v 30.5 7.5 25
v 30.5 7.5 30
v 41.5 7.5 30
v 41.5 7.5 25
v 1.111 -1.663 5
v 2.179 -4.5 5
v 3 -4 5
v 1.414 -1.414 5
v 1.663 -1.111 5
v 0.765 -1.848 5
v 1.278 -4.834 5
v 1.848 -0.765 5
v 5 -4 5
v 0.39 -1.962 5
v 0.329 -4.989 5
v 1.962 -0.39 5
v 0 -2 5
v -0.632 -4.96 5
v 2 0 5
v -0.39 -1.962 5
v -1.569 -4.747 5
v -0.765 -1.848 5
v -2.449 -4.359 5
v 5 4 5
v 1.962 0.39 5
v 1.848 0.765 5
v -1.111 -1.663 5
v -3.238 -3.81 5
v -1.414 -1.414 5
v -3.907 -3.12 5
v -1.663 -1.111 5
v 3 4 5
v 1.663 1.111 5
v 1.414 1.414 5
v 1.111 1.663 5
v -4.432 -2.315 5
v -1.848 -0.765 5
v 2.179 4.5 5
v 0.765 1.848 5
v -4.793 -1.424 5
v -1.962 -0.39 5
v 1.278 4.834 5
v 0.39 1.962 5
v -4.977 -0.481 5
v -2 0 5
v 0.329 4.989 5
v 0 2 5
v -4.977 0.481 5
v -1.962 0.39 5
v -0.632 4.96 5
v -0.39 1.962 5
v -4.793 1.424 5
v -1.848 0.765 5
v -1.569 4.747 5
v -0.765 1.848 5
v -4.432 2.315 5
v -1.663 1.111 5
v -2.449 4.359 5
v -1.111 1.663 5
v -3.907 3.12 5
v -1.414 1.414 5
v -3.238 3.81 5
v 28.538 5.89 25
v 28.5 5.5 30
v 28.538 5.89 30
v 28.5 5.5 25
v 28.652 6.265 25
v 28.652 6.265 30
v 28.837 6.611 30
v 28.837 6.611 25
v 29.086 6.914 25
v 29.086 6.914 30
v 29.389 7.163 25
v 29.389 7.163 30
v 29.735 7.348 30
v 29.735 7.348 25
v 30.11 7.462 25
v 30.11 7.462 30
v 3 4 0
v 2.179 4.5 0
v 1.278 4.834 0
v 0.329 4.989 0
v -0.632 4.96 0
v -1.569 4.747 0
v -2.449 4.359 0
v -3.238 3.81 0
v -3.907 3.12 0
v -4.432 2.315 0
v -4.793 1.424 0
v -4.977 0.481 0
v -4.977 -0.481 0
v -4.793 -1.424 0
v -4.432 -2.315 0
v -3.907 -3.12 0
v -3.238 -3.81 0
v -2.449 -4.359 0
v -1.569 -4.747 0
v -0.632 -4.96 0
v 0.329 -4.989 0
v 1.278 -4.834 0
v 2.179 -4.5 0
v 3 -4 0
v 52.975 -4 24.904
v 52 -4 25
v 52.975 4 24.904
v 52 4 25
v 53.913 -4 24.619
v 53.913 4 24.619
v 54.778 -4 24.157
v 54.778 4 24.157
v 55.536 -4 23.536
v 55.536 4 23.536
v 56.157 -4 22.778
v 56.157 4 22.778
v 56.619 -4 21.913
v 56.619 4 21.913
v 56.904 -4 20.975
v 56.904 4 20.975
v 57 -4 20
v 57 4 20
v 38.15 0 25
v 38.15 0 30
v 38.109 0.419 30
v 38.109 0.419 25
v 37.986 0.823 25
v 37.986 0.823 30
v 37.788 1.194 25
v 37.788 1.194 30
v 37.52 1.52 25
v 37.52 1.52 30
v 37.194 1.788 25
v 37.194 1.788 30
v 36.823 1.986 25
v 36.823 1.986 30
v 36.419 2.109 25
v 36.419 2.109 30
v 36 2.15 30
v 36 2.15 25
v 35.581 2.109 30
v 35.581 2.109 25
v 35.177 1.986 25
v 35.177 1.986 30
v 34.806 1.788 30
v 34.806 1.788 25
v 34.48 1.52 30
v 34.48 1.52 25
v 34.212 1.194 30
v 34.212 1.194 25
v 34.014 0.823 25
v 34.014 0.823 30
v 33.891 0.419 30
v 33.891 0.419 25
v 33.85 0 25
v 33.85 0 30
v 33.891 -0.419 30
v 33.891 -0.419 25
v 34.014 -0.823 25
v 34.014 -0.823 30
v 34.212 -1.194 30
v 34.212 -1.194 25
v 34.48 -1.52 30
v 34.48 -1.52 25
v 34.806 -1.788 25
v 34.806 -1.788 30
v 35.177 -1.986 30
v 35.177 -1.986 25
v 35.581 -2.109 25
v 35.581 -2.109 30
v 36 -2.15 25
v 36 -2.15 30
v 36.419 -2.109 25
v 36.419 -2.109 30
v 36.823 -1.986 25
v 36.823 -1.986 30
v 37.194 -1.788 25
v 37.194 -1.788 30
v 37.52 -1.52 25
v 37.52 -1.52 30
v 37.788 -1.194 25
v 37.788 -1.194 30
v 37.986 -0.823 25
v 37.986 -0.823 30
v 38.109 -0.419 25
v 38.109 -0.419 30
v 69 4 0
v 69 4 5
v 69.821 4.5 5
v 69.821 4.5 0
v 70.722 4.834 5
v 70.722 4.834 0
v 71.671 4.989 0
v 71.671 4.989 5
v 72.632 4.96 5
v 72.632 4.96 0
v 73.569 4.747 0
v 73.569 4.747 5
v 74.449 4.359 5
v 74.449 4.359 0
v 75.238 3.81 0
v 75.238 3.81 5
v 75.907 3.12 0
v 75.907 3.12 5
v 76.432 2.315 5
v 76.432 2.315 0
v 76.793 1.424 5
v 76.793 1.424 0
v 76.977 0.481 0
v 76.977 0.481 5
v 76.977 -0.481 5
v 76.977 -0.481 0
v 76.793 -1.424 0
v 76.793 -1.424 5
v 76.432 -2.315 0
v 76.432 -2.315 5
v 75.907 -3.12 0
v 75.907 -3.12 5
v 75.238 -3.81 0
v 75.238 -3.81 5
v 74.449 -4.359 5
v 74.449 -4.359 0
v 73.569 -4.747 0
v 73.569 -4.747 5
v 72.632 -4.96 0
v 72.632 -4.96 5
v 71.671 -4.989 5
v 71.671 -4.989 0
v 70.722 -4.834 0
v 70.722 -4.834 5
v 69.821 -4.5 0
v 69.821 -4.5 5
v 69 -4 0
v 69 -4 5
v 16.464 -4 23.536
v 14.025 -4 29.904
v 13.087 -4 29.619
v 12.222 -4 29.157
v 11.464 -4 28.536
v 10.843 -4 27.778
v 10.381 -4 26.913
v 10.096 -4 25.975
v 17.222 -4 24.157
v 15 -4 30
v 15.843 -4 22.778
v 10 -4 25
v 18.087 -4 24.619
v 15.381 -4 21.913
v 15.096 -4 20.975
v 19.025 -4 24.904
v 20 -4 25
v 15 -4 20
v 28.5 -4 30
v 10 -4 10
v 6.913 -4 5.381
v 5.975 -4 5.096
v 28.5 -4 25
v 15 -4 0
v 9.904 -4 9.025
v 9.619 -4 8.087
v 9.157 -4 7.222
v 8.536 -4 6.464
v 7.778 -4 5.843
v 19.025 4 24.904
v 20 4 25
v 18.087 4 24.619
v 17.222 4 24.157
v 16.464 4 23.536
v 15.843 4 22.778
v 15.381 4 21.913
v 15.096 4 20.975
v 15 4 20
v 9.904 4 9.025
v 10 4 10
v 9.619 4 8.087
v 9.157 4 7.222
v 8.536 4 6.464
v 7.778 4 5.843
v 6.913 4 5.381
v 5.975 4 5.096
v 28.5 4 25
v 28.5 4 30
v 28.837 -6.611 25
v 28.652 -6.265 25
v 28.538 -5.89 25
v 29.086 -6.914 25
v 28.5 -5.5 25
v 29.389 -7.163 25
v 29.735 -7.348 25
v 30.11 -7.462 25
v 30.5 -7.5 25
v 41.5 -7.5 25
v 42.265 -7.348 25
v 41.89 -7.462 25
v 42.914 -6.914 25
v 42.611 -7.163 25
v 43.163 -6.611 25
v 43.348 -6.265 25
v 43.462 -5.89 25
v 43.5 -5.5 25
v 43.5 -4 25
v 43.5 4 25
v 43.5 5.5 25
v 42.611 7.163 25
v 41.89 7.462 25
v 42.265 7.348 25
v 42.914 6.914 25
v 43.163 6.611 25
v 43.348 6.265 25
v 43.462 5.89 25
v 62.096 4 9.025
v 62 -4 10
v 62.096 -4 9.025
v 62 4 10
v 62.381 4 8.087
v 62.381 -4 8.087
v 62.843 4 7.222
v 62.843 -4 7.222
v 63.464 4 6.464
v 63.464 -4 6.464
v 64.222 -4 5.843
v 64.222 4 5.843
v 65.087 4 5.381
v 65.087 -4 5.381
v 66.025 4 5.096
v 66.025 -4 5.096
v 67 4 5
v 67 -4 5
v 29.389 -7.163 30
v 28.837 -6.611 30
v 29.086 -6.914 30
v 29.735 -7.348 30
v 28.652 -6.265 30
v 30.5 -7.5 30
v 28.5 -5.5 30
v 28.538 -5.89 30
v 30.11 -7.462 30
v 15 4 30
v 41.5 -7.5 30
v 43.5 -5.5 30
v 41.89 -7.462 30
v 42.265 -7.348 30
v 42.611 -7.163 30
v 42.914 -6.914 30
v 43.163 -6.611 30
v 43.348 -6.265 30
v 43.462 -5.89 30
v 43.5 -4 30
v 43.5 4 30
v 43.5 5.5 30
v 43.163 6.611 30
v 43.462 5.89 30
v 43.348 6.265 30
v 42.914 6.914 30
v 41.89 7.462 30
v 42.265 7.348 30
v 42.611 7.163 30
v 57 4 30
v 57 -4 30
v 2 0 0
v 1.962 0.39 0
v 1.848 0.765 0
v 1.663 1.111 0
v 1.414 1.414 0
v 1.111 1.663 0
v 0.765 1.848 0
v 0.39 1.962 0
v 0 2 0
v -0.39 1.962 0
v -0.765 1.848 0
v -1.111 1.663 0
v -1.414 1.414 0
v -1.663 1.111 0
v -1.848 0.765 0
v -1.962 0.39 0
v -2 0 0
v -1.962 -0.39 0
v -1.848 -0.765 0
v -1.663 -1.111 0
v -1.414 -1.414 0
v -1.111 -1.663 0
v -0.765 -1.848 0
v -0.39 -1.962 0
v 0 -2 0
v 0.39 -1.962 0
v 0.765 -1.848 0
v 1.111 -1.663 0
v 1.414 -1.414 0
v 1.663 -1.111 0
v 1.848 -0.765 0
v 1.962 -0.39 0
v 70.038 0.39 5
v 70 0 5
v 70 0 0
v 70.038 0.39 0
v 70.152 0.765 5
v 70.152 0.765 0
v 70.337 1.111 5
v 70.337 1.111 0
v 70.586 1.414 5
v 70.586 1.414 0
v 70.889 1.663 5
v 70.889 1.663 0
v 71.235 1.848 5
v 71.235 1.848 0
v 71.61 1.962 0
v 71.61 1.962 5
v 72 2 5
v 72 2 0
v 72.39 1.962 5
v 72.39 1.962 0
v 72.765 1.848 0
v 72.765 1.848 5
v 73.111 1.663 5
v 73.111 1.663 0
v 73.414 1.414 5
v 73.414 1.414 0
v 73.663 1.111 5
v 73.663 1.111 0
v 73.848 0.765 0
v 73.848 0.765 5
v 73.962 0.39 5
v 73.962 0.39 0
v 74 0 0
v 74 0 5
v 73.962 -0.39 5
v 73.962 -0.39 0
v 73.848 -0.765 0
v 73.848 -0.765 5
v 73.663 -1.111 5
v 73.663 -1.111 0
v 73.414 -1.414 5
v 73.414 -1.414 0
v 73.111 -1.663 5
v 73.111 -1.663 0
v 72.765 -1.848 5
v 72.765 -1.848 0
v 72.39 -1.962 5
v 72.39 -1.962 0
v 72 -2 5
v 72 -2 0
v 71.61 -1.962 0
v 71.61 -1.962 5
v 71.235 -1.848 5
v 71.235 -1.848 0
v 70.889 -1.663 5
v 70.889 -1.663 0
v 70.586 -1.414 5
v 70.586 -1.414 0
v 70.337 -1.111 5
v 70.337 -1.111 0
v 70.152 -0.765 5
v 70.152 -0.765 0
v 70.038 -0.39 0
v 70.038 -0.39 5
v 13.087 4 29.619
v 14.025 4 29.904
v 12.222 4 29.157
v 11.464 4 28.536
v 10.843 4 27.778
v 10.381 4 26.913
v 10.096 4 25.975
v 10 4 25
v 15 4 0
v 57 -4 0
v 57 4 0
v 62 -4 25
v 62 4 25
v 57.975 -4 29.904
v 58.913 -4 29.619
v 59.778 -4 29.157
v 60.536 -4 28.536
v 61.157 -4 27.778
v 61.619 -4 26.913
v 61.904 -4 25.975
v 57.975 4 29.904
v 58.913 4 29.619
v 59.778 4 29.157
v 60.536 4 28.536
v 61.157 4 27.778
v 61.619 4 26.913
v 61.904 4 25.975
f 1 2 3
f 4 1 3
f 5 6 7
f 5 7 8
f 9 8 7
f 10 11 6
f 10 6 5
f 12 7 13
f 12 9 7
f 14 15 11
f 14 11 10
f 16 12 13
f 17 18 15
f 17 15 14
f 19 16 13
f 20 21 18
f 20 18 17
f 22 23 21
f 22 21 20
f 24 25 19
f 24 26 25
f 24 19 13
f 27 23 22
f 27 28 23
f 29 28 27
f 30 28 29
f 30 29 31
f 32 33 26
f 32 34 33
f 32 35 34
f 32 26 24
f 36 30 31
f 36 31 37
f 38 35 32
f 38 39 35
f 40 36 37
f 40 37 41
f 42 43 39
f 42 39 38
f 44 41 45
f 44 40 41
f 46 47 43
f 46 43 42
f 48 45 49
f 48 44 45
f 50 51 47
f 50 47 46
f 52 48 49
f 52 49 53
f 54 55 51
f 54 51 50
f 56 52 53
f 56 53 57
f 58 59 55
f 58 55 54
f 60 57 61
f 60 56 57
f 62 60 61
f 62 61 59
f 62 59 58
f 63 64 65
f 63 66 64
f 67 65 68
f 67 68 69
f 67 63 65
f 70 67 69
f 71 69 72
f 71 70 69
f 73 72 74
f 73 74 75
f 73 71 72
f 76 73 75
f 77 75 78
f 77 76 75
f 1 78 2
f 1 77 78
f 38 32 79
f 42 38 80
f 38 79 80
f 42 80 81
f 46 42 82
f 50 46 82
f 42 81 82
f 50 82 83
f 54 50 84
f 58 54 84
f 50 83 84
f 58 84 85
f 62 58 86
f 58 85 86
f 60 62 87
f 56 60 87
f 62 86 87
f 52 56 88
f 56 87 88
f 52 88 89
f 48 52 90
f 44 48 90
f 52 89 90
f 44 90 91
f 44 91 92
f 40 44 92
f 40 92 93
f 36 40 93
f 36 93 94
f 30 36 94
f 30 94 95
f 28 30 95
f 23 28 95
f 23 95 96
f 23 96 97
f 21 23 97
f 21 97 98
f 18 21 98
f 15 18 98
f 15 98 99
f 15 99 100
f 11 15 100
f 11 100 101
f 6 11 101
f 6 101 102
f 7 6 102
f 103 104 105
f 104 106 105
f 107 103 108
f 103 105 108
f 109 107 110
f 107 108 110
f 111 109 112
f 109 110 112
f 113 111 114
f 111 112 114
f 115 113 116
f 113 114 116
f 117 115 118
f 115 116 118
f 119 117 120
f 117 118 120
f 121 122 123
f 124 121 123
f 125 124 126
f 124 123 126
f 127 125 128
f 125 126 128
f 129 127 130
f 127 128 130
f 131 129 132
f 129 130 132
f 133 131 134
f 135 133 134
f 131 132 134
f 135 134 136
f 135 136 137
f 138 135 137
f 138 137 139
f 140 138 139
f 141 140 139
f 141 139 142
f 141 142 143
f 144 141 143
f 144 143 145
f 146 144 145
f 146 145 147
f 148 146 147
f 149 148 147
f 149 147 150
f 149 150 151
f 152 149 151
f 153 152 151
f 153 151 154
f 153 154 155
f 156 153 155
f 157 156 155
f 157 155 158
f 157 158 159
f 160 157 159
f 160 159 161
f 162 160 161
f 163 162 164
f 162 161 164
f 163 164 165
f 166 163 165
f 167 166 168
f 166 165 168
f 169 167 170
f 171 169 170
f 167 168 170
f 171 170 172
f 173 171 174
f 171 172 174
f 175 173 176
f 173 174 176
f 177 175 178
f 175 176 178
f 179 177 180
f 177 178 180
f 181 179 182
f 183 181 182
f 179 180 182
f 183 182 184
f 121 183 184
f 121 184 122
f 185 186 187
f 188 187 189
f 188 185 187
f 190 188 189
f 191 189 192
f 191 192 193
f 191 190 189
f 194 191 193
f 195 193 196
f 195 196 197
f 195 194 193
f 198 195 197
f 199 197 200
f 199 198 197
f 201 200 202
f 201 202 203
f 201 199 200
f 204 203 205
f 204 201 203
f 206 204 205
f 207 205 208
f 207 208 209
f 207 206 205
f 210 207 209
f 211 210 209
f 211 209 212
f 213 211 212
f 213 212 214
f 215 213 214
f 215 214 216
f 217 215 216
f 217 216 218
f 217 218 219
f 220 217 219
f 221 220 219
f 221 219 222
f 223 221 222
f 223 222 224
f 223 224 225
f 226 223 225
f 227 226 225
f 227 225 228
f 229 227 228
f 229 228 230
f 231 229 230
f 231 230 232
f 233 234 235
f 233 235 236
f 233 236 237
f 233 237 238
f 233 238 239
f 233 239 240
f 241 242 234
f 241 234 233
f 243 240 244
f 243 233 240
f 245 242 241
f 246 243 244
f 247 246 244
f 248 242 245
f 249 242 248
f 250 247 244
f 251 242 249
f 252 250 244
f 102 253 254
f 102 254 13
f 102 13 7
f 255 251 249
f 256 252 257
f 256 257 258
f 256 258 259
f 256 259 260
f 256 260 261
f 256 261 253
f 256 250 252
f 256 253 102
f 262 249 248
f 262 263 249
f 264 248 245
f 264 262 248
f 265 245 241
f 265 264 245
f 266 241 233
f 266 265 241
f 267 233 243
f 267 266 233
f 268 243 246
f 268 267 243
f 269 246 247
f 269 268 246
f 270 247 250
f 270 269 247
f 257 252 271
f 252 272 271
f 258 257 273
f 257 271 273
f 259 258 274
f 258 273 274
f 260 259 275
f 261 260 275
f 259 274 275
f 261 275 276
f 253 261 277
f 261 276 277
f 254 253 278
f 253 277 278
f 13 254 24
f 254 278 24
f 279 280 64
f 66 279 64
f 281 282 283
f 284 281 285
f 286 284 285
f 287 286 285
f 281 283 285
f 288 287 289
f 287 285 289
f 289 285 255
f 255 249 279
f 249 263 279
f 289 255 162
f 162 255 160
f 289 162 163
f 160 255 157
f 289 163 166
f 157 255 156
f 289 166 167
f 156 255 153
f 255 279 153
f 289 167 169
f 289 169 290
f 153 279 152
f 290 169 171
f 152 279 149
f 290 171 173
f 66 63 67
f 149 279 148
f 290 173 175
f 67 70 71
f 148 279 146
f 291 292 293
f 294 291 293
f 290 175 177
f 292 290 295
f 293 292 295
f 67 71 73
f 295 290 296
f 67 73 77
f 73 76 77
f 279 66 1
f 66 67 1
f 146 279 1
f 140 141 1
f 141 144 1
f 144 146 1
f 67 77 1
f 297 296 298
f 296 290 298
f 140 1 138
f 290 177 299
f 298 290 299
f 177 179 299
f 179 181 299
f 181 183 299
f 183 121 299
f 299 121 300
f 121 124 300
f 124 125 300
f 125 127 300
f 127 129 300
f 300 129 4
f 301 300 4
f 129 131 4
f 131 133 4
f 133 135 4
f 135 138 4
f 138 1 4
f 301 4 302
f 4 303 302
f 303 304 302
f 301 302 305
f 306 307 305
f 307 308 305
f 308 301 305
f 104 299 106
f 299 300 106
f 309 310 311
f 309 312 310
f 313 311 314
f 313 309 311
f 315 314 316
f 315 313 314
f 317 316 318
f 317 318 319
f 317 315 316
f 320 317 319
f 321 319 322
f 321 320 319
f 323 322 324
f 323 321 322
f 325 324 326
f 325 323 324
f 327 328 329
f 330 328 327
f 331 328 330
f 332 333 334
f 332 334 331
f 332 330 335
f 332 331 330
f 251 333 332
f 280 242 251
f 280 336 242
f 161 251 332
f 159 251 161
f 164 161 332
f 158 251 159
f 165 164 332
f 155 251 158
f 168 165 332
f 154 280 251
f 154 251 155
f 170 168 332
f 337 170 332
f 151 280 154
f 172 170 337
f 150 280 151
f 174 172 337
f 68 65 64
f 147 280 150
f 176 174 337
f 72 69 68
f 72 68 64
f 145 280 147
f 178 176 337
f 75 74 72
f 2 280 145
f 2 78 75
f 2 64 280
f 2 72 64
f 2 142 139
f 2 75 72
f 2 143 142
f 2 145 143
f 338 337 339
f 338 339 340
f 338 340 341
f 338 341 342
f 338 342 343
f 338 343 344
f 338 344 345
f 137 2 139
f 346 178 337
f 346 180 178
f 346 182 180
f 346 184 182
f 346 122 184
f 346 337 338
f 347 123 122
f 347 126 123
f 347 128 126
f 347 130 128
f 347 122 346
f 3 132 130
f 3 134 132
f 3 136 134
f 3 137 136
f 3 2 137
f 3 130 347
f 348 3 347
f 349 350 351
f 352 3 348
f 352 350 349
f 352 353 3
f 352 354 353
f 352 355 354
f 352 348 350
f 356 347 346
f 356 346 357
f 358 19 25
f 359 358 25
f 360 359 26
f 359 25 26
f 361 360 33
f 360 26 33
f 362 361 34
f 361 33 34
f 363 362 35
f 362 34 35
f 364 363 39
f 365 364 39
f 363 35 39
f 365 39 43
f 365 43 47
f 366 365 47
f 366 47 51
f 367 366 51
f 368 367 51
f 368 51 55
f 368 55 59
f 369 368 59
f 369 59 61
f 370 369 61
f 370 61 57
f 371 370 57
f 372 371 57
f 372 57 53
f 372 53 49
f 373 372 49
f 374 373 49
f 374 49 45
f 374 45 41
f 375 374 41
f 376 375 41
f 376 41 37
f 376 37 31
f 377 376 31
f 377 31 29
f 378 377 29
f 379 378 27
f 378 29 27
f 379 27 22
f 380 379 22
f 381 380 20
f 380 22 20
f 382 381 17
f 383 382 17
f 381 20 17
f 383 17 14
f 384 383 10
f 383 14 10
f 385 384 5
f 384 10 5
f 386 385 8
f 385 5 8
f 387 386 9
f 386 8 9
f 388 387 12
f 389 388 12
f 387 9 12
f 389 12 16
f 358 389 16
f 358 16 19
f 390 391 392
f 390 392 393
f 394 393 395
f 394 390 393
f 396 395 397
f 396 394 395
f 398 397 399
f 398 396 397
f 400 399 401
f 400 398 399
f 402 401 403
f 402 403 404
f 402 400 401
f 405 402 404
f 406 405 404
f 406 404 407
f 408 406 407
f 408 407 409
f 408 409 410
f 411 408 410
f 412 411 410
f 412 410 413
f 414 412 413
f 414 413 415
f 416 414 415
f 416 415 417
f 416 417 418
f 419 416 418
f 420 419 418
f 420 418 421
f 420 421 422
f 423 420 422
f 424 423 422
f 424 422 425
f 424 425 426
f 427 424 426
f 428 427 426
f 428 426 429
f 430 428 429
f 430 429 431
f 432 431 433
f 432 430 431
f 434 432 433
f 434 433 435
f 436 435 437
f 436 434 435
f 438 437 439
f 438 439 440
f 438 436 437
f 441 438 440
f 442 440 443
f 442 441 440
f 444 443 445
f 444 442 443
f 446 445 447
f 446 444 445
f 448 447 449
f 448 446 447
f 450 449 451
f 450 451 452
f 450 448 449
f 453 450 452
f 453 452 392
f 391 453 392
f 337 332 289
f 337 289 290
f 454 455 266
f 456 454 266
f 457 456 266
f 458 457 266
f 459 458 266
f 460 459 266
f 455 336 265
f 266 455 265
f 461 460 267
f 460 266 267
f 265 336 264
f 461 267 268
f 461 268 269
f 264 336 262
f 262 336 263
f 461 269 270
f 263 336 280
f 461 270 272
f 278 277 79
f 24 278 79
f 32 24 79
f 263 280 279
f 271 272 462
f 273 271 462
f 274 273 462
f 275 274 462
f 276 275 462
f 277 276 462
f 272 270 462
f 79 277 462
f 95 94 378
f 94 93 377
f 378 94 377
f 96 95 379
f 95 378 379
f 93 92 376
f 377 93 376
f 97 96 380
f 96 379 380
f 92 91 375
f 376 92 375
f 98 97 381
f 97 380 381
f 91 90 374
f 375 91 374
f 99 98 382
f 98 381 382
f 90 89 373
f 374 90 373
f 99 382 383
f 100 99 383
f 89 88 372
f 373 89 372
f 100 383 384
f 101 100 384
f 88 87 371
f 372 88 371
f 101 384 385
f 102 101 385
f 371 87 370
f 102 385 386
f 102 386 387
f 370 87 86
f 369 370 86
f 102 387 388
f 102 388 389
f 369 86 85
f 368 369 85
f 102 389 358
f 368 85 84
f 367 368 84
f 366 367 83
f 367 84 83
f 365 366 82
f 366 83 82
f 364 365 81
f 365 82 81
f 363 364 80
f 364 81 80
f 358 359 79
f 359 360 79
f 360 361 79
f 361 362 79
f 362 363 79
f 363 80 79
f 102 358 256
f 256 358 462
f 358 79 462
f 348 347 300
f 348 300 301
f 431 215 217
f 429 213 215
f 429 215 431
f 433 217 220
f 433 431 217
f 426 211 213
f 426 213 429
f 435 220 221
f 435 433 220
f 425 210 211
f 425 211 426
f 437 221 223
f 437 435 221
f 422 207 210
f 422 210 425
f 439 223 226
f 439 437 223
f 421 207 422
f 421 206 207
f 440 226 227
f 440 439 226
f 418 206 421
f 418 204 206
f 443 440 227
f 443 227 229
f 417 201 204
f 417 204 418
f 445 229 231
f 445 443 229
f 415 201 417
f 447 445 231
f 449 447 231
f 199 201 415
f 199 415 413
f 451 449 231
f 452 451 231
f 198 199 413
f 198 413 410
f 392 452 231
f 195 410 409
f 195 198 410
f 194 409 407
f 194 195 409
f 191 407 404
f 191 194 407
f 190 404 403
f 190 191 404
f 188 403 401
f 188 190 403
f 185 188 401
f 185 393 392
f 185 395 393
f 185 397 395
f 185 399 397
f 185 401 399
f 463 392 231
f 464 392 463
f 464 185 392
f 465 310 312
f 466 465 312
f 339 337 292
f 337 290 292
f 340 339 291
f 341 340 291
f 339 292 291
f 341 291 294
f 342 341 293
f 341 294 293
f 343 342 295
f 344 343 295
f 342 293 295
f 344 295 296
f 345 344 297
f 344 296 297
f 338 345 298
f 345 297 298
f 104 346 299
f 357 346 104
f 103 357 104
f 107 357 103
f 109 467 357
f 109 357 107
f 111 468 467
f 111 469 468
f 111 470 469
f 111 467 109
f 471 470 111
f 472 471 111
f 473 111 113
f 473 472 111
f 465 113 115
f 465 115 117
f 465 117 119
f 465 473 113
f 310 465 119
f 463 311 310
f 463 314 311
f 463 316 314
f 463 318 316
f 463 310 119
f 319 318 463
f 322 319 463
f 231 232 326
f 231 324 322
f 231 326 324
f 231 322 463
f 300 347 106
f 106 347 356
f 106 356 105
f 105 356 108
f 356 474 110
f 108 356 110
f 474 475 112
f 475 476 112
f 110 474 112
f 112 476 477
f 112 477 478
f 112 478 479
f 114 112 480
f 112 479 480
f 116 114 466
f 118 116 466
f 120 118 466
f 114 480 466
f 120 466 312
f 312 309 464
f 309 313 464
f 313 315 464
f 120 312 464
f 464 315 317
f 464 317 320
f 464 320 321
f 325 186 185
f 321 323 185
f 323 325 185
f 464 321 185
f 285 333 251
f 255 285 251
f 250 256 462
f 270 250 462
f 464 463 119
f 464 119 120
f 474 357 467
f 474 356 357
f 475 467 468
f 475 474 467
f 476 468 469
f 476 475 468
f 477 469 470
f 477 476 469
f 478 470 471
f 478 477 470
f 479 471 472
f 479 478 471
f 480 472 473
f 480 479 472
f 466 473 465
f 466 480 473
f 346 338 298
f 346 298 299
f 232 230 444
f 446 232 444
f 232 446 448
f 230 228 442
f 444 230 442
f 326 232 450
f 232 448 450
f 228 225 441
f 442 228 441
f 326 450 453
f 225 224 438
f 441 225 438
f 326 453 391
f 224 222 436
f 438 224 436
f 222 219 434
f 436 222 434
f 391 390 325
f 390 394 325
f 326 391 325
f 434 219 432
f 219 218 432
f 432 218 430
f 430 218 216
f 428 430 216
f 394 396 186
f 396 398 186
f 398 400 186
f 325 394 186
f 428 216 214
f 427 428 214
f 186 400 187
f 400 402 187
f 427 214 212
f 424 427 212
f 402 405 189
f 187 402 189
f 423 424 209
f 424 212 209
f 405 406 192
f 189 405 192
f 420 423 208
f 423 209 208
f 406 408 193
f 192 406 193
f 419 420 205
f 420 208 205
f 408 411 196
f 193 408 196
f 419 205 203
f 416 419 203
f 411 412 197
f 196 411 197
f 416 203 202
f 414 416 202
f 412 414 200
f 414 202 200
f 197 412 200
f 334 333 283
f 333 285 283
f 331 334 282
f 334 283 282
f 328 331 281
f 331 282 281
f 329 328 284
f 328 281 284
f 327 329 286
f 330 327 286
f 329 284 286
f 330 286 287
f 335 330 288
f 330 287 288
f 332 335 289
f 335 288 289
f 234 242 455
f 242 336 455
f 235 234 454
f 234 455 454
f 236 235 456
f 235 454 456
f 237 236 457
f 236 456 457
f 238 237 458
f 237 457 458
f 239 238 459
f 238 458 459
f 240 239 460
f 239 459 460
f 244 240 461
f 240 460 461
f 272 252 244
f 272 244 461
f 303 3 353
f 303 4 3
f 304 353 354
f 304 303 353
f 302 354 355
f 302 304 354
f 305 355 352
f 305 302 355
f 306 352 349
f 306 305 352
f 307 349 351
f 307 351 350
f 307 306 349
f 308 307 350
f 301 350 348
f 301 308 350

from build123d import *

# Parameters (mm, degrees)
SKETCH_1_R          = 5
EXTRUDE_1_DEPTH     = 5
SKETCH_3_W          = 5
SKETCH_3_H          = 8
EXTRUDE_2_DEPTH     = 15
SKETCH_2_R          = 2
CUT_EXTRUDE_1_DEPTH = 30
SKETCH_6_W          = 5
SKETCH_6_H          = 8
EXTRUDE_4_DEPTH     = 25
SKETCH_7_W          = 5
SKETCH_7_H          = 8
EXTRUDE_5_DEPTH     = 21
SKETCH_8_W          = 15
SKETCH_8_H          = 15
EXTRUDE_6_DEPTH     = 5
FILLET_2_R          = 2
SKETCH_9_R          = 2.15
CUT_EXTRUDE_2_DEPTH = 10
FILLET_3_R          = 5


with BuildPart() as part:
    # 草图1 → 凸台-拉伸1 (new body)
    with BuildSketch(Plane.XY):
        Circle(SKETCH_1_R)
    extrude(amount=EXTRUDE_1_DEPTH)

    # 草图3 → 凸台-拉伸2 (add)
    with BuildSketch(Plane(origin=(0, 0, 0), x_dir=(0, 0, -1), z_dir=(1, 0, 0))):
        with Locations((-2.5, 0)):
            Rectangle(SKETCH_3_W, SKETCH_3_H)
    extrude(amount=EXTRUDE_2_DEPTH)

    # 草图2 → 切除-拉伸1 (cut)
    with BuildSketch(Plane.XY.offset(5)):
        Circle(SKETCH_2_R)
    extrude(amount=-CUT_EXTRUDE_1_DEPTH, mode=Mode.SUBTRACT)

    # 草图6 → 凸台-拉伸4 (add)
    with BuildSketch(Plane.XY.offset(5)):
        with Locations((12.5, 0)):
            Rectangle(SKETCH_6_W, SKETCH_6_H)
    extrude(amount=EXTRUDE_4_DEPTH)

    # 草图7 → 凸台-拉伸5 (add)
    with BuildSketch(Plane(origin=(15, 0, 0), x_dir=(0, 0, -1), z_dir=(1, 0, 0))):
        with Locations((-27.5, 0)):
            Rectangle(SKETCH_7_W, SKETCH_7_H)
    extrude(amount=EXTRUDE_5_DEPTH)

    # 镜向2: part across plane


with BuildPart() as part_1:
    add(part.part)
    add(part.part.mirror(Plane(origin=(36, 0, 0), x_dir=(0, 0, 1), z_dir=(1, 0, 0))))

    # 草图8 → 凸台-拉伸6 (add)
    with BuildSketch(Plane.XY.offset(30)):
        with Locations((36, 0)):
            Rectangle(SKETCH_8_W, SKETCH_8_H)
    extrude(amount=-EXTRUDE_6_DEPTH)

    # 圆角2
    fillet_2_edges = [part_1.edges().sort_by_distance(p)[0] for p in [
        (28.5, -7.5, 27.5),
        (43.5, 7.5, 27.5),
        (28.5, 7.5, 27.5),
        (43.5, -7.5, 27.5),
    ]]
    fillet(fillet_2_edges, radius=FILLET_2_R)

    # 草图9 → 切除-拉伸2 (cut)
    with BuildSketch(Plane.XY.offset(30)):
        with Locations((36, 0)):
            Circle(SKETCH_9_R)
    extrude(amount=-CUT_EXTRUDE_2_DEPTH, mode=Mode.SUBTRACT)

    # 圆角3
    fillet_3_edges = [part_1.edges().sort_by_distance(p)[0] for p in [
        (10, 0, 5),
        (10, 0, 30),
        (15, 0, 25),
        (57, 0, 25),
        (62, 0, 5),
        (62, 0, 30),
    ]]
    fillet(fillet_3_edges, radius=FILLET_3_R)


solid = part_1.part
